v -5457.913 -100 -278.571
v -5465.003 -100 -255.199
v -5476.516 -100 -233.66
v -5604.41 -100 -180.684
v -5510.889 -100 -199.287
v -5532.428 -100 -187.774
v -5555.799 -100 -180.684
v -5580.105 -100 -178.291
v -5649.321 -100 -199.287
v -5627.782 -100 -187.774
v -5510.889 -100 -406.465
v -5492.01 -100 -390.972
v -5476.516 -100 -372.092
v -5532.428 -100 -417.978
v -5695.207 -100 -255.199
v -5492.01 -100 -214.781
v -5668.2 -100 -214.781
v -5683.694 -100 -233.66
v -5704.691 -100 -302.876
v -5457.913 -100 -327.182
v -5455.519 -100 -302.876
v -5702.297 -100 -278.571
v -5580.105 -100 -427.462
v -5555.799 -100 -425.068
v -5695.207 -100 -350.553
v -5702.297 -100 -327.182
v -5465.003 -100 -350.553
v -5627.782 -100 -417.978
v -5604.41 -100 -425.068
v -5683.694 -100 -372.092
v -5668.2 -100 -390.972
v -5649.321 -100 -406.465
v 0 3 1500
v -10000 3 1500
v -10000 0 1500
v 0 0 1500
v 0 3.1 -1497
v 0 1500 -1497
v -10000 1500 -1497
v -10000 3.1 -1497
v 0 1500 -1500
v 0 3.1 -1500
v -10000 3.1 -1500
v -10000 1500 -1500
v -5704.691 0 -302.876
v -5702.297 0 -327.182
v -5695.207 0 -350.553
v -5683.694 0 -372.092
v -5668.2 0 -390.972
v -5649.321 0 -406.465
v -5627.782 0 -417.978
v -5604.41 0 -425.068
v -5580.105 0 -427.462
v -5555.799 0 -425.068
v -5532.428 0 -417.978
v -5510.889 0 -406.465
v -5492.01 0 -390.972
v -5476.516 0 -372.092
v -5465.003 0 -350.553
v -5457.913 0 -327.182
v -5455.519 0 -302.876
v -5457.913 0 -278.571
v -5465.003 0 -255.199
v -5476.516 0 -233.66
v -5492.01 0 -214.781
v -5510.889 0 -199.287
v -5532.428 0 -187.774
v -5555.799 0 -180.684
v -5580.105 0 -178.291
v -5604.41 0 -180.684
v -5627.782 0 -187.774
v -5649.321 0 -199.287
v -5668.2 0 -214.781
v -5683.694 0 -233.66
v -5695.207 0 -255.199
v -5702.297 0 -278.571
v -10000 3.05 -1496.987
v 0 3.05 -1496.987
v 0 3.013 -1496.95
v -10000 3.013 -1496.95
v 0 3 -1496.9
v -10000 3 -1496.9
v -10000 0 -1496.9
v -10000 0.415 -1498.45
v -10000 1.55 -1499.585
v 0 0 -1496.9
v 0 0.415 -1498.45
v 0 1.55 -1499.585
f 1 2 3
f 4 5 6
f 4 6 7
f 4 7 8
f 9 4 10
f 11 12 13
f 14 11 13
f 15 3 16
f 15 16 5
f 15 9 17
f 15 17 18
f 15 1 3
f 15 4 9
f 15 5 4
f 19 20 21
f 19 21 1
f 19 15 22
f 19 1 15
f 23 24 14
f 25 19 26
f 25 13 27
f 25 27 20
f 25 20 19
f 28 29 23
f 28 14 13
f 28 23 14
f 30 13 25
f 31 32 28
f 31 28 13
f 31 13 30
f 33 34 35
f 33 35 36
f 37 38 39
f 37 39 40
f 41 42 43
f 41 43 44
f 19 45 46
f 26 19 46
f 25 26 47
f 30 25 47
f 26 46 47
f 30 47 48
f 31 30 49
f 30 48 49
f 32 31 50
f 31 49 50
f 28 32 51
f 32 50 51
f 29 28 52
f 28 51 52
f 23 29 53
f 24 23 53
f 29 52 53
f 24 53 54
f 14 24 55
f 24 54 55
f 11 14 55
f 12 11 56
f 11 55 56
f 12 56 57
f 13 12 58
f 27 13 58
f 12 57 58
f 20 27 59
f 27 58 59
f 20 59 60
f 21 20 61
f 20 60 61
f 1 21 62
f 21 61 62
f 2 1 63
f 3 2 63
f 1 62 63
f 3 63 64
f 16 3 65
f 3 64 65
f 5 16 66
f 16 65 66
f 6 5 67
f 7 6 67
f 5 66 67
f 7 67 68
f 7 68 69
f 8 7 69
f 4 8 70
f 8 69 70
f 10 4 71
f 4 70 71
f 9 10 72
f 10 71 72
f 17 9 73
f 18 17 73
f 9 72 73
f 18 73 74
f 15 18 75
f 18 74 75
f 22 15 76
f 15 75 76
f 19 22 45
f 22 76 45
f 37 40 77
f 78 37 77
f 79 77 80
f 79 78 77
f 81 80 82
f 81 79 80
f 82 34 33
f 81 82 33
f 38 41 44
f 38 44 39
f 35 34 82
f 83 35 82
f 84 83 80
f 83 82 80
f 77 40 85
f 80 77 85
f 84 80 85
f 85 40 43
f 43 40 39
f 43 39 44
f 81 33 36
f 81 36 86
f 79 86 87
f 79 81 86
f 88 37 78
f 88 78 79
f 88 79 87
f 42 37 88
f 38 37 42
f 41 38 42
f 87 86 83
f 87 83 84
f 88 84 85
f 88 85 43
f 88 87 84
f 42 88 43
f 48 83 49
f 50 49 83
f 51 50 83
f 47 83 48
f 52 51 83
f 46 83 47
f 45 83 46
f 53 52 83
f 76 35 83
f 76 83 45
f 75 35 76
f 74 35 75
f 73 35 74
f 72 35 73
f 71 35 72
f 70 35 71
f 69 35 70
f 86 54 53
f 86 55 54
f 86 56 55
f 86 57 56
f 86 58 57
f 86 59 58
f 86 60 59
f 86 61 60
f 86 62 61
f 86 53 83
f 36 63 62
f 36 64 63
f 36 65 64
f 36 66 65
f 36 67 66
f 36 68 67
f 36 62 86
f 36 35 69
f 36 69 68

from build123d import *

# Parameters (mm, degrees)
SKETCH_1_W                       = 10000
SKETCH_1_H                       = 3
SM_BASE_FLANGE_1_DEPTH           = 1500
SM_EDGE_FLANGE_1_STRIP_W         = 12.2
SM_EDGE_FLANGE_1_STRIP_H         = 3
SM_EDGE_FLANGE_1_STRIP_CUT_DEPTH = 10000
SM_EDGE_FLANGE_1_DEPTH           = 10000
SKETCH_9_R                       = 124.585629419
EXTRUDE_1_DEPTH                  = 100


# Sheet-metal steps are written as plain solids
with BuildPart() as part:
    # Sketch 1 → 基体-法兰1 (new, symmetric)
    with BuildSketch(Plane.XY):
        with Locations((-5000, 1.5)):
            Rectangle(SKETCH_1_W, SKETCH_1_H)
    extrude(amount=SM_BASE_FLANGE_1_DEPTH, both=True)

    # 边线-法兰1 strip (across the edge) → 边线-法兰1 strip cut (cut)
    with BuildSketch(Plane(origin=(0, 3, -1500), x_dir=(0, 0, 1), z_dir=(-1, 0, 0))):
        with Locations((-3, -1.5)):
            Rectangle(SM_EDGE_FLANGE_1_STRIP_W, SM_EDGE_FLANGE_1_STRIP_H)
    extrude(amount=SM_EDGE_FLANGE_1_STRIP_CUT_DEPTH, mode=Mode.SUBTRACT)

    # 边线-法兰1 section (across the edge) → 边线-法兰1 (add)
    with BuildSketch(Plane(origin=(0, 3, -1500), x_dir=(0, 0, 1), z_dir=(-1, 0, 0))):
        with BuildLine():
            Line((0, 0.1), (0, 1497))
            Line((0, 1497), (3, 1497))
            Line((3, 1497), (3, 0.1))
            ThreePointArc((3, 0.1), (3.029289322, 0.029289322), (3.1, 0))
            Line((3.1, 0), (3.1, -3))
            ThreePointArc((3.1, -3), (0.907968978, -2.092031022), (0, 0.1))
        make_face()
    extrude(amount=SM_EDGE_FLANGE_1_DEPTH)

    # 草图9 → 凸台-拉伸1 (add)
    with BuildSketch(Plane.XZ):
        with Locations(Location((-5580.104880993, -302.876251182, 0), (0, 0, 180))):
            Circle(SKETCH_9_R)
    extrude(amount=EXTRUDE_1_DEPTH)


solid = part.part
